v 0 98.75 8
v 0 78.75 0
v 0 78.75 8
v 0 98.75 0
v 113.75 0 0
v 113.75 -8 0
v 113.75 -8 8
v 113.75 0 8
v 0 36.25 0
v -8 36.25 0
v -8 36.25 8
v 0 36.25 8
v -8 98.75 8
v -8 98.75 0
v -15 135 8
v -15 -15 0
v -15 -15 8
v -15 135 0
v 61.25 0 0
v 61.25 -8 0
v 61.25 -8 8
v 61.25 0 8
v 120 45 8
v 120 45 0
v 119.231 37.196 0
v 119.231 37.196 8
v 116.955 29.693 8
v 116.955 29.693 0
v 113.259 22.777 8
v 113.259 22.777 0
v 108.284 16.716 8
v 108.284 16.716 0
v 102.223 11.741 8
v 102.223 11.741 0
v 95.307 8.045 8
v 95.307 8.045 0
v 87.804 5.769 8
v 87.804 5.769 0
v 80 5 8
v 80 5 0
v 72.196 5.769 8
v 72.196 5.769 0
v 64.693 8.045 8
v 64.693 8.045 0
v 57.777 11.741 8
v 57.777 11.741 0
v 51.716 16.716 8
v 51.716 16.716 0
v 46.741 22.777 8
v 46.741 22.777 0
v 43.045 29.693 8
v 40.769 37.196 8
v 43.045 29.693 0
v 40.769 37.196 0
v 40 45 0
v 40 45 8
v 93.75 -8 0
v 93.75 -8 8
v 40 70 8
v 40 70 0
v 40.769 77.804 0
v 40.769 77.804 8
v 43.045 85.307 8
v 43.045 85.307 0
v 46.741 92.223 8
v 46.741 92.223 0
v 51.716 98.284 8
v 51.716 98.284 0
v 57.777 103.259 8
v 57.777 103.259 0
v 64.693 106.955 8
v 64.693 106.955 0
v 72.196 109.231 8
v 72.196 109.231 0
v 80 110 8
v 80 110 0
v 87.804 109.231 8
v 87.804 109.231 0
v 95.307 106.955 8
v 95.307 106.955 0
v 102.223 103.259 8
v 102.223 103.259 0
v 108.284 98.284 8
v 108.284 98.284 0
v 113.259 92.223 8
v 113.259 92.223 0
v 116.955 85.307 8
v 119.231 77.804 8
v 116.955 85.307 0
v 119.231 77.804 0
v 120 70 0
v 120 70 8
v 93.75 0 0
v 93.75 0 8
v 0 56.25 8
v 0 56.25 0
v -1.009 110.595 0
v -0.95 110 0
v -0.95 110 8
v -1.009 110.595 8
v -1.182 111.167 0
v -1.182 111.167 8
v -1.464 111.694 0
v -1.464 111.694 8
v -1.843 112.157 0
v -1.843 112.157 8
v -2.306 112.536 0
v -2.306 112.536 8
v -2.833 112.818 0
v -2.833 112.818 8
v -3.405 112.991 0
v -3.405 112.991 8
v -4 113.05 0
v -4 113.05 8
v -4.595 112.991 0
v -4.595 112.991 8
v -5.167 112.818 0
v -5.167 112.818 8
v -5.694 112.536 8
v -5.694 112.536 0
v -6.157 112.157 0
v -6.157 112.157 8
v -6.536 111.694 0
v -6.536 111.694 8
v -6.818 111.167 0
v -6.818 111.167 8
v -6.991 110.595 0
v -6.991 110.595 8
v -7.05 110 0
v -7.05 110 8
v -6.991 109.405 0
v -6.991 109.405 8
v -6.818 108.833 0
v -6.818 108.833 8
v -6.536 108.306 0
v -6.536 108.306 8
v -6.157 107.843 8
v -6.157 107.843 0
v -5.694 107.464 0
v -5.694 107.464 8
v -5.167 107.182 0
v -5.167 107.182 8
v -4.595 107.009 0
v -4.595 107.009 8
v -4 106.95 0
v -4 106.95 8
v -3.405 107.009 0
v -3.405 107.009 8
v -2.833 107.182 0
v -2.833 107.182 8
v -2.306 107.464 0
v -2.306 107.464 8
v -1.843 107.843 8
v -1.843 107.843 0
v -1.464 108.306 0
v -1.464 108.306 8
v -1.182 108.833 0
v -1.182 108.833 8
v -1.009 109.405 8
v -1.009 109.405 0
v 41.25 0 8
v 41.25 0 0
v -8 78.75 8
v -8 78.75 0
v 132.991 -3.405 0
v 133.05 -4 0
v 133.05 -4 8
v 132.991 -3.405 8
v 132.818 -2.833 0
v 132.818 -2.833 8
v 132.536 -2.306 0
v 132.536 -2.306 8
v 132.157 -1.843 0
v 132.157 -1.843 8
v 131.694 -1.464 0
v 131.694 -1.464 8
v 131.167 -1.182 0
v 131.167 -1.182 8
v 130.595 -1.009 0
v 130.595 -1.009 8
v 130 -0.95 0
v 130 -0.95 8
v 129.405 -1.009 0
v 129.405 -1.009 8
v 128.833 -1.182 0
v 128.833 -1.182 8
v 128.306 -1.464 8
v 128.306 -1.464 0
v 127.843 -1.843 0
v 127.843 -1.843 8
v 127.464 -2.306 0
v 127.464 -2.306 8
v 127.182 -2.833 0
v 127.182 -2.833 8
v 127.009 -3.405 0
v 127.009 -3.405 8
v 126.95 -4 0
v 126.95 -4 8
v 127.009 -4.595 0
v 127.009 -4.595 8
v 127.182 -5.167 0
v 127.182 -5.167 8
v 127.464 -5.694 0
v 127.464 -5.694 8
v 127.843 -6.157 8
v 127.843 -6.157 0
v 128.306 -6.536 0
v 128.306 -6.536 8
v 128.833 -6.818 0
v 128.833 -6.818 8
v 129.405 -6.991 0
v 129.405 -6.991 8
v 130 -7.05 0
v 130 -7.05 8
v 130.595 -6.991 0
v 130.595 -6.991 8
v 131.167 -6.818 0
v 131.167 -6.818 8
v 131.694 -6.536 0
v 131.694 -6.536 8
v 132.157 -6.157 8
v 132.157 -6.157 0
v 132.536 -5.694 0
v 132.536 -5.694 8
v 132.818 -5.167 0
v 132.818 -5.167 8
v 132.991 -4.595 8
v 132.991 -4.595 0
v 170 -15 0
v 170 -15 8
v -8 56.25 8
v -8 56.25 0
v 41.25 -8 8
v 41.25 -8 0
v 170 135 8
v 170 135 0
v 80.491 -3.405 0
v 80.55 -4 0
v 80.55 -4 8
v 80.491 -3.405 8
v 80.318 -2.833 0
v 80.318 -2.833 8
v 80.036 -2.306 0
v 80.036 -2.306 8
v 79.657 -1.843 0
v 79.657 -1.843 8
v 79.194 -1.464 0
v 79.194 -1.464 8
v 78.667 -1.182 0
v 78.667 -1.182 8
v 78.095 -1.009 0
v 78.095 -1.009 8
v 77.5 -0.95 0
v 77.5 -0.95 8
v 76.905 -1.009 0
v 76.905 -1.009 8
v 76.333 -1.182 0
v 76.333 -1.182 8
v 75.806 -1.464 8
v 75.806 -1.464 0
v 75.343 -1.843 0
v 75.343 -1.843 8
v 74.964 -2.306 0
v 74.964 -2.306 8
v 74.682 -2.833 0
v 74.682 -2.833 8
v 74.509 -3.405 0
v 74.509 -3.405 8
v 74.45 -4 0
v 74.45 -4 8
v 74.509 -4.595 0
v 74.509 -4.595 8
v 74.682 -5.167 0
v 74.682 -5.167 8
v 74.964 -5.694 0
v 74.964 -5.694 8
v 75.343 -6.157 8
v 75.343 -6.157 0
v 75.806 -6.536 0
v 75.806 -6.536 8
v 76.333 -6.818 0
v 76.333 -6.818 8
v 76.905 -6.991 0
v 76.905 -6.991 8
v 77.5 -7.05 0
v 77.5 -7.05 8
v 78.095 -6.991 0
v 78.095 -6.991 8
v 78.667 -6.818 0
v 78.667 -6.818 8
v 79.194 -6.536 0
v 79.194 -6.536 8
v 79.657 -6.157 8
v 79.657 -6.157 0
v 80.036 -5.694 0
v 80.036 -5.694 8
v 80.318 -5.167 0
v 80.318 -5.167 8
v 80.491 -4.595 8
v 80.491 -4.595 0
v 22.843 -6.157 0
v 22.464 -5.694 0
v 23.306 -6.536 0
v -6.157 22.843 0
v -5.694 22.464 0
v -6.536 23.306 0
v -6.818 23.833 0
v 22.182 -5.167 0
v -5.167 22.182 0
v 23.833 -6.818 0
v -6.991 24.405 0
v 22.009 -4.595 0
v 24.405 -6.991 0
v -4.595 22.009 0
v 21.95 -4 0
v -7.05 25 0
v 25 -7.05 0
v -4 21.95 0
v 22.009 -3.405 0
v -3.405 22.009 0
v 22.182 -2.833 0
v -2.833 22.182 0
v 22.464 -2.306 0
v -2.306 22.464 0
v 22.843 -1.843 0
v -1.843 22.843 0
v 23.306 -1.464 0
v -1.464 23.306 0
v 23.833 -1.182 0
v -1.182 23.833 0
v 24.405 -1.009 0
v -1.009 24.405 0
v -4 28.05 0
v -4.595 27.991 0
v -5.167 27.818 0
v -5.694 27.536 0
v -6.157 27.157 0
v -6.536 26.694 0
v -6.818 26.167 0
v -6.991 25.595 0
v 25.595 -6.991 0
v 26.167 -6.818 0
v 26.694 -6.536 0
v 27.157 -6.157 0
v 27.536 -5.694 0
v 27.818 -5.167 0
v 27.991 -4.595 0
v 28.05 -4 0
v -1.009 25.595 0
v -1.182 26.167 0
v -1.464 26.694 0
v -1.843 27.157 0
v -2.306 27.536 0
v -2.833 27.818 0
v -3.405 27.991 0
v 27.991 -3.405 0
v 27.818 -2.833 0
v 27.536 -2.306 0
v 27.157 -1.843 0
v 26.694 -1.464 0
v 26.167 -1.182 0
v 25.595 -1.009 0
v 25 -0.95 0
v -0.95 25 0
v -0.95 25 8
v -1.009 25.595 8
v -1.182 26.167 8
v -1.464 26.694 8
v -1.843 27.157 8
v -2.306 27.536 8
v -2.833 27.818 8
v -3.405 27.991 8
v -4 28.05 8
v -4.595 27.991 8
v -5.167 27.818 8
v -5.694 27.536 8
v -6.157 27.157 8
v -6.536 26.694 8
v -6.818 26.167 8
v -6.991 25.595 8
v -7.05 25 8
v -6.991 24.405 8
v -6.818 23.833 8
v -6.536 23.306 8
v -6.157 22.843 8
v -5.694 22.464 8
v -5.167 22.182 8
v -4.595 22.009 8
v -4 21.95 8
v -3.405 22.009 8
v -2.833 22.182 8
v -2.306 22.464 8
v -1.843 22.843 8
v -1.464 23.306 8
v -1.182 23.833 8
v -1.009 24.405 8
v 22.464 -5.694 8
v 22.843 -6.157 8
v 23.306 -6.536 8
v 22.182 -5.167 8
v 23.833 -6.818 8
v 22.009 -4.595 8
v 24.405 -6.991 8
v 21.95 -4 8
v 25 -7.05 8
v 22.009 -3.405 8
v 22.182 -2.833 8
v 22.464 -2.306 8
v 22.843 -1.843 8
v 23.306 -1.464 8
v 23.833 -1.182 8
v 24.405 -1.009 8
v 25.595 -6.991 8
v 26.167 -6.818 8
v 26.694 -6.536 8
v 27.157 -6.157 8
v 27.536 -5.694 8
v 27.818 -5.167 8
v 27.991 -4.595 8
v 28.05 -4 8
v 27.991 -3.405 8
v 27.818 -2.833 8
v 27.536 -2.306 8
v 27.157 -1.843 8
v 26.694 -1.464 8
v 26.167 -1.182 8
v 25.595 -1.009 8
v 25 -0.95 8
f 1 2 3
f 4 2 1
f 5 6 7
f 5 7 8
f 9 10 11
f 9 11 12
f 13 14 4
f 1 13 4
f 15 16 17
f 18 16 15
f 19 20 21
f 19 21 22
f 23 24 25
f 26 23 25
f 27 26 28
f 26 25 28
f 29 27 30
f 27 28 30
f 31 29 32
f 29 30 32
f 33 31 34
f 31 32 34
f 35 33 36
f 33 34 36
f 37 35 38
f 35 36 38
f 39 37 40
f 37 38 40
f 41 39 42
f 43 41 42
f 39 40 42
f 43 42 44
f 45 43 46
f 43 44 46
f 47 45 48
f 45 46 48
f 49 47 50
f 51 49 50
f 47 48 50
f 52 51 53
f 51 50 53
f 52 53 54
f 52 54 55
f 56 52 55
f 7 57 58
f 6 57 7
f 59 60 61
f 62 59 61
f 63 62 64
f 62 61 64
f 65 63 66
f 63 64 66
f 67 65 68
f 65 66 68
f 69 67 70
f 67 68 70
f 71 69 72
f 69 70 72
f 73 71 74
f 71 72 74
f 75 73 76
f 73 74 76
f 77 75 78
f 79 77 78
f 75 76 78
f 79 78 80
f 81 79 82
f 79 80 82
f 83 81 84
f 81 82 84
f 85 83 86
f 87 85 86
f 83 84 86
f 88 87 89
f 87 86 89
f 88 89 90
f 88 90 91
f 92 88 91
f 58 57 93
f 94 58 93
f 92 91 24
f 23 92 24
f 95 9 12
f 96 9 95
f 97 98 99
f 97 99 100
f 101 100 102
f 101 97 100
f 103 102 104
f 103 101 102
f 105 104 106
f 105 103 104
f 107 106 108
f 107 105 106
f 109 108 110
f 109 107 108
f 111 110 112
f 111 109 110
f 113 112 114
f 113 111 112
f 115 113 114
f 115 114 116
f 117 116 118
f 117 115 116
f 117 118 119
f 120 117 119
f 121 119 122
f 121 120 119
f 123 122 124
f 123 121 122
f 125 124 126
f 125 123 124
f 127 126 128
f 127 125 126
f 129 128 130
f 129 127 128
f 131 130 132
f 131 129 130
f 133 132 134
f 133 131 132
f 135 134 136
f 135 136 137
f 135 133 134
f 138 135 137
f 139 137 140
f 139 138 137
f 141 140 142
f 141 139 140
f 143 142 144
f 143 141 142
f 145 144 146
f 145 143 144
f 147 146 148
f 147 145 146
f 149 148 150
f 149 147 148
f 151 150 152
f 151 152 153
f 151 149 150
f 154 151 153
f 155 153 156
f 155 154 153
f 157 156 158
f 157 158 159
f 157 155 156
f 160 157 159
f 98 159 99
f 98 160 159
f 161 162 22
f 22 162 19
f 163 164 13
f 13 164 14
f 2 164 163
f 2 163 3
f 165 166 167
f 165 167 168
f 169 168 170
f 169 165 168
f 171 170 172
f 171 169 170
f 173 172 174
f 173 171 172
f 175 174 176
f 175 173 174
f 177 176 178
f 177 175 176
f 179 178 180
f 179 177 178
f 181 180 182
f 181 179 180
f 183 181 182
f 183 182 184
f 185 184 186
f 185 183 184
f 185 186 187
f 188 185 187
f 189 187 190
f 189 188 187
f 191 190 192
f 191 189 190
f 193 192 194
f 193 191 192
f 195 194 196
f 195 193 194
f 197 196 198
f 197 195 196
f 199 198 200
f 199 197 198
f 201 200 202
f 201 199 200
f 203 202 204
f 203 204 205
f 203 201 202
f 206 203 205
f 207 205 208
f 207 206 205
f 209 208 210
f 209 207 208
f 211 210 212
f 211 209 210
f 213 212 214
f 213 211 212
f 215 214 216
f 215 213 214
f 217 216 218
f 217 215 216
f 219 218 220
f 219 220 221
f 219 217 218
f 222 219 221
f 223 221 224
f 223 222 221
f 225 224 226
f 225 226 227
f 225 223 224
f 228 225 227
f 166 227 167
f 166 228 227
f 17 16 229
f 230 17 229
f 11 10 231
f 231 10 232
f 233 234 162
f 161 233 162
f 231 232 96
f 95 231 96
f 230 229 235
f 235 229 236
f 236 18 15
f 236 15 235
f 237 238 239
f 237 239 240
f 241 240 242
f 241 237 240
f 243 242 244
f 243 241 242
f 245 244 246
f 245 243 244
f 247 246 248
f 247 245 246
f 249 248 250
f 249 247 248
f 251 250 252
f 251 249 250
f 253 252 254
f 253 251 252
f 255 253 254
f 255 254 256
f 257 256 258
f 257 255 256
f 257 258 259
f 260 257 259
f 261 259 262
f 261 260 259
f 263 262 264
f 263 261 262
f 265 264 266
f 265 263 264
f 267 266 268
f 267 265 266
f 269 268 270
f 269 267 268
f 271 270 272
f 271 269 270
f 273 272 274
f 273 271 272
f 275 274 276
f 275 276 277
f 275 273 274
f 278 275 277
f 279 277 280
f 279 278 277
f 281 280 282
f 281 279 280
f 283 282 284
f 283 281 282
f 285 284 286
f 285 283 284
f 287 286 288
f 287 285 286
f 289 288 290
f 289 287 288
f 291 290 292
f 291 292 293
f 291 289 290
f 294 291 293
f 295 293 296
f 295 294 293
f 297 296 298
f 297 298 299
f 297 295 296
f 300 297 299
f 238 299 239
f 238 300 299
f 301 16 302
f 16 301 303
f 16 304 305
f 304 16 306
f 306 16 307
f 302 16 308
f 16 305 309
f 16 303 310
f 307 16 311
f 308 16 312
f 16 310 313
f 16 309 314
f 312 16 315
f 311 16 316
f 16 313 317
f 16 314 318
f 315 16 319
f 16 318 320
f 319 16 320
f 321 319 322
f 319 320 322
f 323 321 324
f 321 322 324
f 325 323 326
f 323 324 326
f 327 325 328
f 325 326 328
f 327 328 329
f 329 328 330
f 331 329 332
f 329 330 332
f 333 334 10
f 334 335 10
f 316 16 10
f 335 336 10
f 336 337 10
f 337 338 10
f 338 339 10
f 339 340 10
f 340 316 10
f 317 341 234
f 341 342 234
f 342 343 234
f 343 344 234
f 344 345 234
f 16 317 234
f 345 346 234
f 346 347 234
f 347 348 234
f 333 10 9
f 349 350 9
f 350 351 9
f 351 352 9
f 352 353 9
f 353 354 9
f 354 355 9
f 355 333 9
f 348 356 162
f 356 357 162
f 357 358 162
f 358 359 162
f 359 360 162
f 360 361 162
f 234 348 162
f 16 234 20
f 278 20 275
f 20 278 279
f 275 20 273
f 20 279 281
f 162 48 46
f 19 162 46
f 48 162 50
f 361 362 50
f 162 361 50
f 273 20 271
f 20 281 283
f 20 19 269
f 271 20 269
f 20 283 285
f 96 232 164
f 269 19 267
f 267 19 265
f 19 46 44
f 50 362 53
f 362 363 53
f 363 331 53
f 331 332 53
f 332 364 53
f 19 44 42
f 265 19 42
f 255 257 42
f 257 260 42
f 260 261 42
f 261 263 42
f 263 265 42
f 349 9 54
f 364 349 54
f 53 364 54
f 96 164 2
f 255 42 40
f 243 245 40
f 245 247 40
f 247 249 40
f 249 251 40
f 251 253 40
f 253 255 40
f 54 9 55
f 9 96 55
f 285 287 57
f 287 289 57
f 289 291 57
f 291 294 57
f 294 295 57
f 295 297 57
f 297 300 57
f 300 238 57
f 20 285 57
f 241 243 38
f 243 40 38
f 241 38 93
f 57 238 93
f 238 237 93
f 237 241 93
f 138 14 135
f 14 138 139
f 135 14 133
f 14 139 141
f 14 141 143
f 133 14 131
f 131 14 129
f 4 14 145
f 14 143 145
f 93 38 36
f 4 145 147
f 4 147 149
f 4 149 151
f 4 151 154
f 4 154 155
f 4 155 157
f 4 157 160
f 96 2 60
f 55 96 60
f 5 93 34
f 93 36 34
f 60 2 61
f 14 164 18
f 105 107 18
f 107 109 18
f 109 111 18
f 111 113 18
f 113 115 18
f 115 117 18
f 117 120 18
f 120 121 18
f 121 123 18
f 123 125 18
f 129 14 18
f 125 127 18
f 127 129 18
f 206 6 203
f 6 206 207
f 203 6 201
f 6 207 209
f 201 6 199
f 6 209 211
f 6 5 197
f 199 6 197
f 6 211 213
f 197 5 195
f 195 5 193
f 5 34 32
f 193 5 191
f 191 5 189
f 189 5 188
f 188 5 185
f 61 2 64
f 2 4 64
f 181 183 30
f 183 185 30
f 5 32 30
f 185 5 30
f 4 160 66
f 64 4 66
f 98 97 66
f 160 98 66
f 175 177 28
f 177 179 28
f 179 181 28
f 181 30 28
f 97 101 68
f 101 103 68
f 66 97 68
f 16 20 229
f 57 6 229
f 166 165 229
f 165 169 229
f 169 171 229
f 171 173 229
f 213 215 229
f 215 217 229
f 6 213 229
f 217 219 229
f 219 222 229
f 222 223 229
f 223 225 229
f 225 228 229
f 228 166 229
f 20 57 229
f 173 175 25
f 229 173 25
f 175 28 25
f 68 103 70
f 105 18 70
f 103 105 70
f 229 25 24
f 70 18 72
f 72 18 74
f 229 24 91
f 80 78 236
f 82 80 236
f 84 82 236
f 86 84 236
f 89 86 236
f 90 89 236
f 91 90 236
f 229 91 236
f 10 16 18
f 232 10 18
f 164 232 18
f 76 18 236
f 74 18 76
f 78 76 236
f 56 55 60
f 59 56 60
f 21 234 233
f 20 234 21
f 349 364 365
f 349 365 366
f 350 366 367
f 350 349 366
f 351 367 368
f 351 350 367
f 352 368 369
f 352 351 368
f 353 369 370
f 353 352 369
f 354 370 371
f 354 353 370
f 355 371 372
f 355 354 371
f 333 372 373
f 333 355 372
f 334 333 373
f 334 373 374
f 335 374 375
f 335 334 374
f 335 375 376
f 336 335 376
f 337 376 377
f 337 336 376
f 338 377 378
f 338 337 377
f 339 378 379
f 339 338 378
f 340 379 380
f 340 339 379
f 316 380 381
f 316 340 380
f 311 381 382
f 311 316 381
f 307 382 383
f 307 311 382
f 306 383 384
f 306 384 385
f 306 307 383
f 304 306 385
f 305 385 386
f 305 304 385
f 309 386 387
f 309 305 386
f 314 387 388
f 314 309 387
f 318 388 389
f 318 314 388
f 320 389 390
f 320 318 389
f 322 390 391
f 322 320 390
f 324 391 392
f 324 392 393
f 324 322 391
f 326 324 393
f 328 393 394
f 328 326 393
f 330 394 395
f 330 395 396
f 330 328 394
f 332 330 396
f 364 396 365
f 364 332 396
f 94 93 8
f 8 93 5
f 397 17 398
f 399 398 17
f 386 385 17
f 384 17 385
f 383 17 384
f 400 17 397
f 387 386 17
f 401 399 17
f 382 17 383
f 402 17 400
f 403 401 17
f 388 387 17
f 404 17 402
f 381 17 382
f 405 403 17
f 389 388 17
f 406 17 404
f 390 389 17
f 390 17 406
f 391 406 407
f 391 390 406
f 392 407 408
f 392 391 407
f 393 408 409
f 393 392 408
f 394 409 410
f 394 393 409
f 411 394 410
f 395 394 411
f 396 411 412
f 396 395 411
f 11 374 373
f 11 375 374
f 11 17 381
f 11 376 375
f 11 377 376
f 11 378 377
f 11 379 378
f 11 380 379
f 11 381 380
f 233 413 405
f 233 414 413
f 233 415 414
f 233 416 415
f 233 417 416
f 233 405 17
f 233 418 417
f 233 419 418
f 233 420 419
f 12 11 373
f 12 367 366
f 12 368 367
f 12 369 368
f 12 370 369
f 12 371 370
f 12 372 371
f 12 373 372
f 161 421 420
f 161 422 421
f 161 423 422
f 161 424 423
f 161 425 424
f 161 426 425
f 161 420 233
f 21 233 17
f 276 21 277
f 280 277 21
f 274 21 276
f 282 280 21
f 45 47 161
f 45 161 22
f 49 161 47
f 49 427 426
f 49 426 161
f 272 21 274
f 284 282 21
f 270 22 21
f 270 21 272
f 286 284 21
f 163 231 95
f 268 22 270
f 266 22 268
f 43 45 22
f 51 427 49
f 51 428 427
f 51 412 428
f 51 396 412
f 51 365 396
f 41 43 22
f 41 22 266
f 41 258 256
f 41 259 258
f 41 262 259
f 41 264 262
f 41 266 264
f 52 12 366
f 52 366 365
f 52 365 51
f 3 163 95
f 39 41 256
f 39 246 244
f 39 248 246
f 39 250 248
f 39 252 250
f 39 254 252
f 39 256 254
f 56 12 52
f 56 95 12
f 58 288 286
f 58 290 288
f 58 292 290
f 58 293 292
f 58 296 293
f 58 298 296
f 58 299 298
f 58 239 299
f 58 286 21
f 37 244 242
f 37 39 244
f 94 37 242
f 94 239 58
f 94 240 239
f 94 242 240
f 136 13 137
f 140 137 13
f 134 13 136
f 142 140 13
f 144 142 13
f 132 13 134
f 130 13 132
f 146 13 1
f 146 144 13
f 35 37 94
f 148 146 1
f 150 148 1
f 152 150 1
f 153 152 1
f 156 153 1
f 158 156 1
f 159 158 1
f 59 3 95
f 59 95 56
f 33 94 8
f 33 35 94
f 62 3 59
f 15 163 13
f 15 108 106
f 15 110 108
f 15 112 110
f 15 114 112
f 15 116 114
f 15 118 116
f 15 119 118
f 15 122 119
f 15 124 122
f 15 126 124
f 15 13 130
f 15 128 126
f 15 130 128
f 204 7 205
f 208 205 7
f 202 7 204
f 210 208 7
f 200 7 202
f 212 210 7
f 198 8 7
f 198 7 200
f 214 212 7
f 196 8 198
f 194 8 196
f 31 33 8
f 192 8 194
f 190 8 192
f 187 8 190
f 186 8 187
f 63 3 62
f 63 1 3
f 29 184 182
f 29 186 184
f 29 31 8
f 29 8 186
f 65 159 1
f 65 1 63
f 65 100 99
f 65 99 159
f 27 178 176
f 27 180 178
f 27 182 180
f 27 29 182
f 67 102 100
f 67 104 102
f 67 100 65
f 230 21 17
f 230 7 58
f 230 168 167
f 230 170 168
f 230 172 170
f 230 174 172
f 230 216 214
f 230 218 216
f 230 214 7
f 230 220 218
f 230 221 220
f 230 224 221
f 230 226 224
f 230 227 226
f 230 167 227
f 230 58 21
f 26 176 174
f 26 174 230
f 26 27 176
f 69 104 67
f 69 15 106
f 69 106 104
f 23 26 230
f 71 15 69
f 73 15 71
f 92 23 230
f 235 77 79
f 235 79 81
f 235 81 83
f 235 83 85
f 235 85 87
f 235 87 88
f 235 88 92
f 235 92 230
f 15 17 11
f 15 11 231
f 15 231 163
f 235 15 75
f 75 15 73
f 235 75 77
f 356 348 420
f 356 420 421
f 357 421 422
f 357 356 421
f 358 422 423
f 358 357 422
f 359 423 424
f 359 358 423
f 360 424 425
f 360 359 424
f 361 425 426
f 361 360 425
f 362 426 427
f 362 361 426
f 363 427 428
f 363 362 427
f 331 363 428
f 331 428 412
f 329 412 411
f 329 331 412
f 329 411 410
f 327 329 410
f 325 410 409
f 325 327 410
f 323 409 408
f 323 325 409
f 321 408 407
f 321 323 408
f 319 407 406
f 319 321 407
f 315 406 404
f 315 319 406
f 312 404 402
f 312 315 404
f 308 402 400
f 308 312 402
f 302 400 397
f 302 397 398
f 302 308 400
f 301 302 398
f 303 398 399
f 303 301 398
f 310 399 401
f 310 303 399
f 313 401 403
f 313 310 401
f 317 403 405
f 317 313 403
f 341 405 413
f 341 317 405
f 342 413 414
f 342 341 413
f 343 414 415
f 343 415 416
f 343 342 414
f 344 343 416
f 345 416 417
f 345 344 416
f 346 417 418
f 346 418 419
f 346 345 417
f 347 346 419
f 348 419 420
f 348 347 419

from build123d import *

# Parameters (mm, degrees)
MODEL_W             = 185
MODEL_H             = 150
MODEL_R             = 3.05
MODEL_W_2           = 20
MODEL_H_2           = 8
MODEL_W_3           = 8
MODEL_H_3           = 20
BOSS_EXTRUDE1_DEPTH = 8


with BuildPart() as part:
    # Model → Boss-Extrude1 (new body)
    with BuildSketch(Plane.XY):
        with Locations((77.5, 60)):
            Rectangle(MODEL_W, MODEL_H)
        with Locations((77.5, -4)):
            Circle(MODEL_R, mode=Mode.SUBTRACT)
        with Locations((-4, 110)):
            Circle(MODEL_R, mode=Mode.SUBTRACT)
        with Locations((-4, 25)):
            Circle(MODEL_R, mode=Mode.SUBTRACT)
        with Locations((25, -4)):
            Circle(MODEL_R, mode=Mode.SUBTRACT)
        with Locations((130, -4)):
            Circle(MODEL_R, mode=Mode.SUBTRACT)
        with Locations((51.25, -4)):
            Rectangle(MODEL_W_2, MODEL_H_2, mode=Mode.SUBTRACT)
        with Locations((103.75, -4)):
            Rectangle(MODEL_W_2, MODEL_H_2, mode=Mode.SUBTRACT)
        with BuildLine():
            Line((40, 45), (40, 70))
            ThreePointArc((40, 70), (80, 110), (120, 70))
            Line((120, 70), (120, 45))
            ThreePointArc((120, 45), (80, 5), (40, 45))
        make_face(mode=Mode.SUBTRACT)
        with Locations((-4, 88.75)):
            Rectangle(MODEL_W_3, MODEL_H_3, mode=Mode.SUBTRACT)
        with Locations((-4, 46.25)):
            Rectangle(MODEL_W_3, MODEL_H_3, mode=Mode.SUBTRACT)
    extrude(amount=BOSS_EXTRUDE1_DEPTH)


solid = part.part
